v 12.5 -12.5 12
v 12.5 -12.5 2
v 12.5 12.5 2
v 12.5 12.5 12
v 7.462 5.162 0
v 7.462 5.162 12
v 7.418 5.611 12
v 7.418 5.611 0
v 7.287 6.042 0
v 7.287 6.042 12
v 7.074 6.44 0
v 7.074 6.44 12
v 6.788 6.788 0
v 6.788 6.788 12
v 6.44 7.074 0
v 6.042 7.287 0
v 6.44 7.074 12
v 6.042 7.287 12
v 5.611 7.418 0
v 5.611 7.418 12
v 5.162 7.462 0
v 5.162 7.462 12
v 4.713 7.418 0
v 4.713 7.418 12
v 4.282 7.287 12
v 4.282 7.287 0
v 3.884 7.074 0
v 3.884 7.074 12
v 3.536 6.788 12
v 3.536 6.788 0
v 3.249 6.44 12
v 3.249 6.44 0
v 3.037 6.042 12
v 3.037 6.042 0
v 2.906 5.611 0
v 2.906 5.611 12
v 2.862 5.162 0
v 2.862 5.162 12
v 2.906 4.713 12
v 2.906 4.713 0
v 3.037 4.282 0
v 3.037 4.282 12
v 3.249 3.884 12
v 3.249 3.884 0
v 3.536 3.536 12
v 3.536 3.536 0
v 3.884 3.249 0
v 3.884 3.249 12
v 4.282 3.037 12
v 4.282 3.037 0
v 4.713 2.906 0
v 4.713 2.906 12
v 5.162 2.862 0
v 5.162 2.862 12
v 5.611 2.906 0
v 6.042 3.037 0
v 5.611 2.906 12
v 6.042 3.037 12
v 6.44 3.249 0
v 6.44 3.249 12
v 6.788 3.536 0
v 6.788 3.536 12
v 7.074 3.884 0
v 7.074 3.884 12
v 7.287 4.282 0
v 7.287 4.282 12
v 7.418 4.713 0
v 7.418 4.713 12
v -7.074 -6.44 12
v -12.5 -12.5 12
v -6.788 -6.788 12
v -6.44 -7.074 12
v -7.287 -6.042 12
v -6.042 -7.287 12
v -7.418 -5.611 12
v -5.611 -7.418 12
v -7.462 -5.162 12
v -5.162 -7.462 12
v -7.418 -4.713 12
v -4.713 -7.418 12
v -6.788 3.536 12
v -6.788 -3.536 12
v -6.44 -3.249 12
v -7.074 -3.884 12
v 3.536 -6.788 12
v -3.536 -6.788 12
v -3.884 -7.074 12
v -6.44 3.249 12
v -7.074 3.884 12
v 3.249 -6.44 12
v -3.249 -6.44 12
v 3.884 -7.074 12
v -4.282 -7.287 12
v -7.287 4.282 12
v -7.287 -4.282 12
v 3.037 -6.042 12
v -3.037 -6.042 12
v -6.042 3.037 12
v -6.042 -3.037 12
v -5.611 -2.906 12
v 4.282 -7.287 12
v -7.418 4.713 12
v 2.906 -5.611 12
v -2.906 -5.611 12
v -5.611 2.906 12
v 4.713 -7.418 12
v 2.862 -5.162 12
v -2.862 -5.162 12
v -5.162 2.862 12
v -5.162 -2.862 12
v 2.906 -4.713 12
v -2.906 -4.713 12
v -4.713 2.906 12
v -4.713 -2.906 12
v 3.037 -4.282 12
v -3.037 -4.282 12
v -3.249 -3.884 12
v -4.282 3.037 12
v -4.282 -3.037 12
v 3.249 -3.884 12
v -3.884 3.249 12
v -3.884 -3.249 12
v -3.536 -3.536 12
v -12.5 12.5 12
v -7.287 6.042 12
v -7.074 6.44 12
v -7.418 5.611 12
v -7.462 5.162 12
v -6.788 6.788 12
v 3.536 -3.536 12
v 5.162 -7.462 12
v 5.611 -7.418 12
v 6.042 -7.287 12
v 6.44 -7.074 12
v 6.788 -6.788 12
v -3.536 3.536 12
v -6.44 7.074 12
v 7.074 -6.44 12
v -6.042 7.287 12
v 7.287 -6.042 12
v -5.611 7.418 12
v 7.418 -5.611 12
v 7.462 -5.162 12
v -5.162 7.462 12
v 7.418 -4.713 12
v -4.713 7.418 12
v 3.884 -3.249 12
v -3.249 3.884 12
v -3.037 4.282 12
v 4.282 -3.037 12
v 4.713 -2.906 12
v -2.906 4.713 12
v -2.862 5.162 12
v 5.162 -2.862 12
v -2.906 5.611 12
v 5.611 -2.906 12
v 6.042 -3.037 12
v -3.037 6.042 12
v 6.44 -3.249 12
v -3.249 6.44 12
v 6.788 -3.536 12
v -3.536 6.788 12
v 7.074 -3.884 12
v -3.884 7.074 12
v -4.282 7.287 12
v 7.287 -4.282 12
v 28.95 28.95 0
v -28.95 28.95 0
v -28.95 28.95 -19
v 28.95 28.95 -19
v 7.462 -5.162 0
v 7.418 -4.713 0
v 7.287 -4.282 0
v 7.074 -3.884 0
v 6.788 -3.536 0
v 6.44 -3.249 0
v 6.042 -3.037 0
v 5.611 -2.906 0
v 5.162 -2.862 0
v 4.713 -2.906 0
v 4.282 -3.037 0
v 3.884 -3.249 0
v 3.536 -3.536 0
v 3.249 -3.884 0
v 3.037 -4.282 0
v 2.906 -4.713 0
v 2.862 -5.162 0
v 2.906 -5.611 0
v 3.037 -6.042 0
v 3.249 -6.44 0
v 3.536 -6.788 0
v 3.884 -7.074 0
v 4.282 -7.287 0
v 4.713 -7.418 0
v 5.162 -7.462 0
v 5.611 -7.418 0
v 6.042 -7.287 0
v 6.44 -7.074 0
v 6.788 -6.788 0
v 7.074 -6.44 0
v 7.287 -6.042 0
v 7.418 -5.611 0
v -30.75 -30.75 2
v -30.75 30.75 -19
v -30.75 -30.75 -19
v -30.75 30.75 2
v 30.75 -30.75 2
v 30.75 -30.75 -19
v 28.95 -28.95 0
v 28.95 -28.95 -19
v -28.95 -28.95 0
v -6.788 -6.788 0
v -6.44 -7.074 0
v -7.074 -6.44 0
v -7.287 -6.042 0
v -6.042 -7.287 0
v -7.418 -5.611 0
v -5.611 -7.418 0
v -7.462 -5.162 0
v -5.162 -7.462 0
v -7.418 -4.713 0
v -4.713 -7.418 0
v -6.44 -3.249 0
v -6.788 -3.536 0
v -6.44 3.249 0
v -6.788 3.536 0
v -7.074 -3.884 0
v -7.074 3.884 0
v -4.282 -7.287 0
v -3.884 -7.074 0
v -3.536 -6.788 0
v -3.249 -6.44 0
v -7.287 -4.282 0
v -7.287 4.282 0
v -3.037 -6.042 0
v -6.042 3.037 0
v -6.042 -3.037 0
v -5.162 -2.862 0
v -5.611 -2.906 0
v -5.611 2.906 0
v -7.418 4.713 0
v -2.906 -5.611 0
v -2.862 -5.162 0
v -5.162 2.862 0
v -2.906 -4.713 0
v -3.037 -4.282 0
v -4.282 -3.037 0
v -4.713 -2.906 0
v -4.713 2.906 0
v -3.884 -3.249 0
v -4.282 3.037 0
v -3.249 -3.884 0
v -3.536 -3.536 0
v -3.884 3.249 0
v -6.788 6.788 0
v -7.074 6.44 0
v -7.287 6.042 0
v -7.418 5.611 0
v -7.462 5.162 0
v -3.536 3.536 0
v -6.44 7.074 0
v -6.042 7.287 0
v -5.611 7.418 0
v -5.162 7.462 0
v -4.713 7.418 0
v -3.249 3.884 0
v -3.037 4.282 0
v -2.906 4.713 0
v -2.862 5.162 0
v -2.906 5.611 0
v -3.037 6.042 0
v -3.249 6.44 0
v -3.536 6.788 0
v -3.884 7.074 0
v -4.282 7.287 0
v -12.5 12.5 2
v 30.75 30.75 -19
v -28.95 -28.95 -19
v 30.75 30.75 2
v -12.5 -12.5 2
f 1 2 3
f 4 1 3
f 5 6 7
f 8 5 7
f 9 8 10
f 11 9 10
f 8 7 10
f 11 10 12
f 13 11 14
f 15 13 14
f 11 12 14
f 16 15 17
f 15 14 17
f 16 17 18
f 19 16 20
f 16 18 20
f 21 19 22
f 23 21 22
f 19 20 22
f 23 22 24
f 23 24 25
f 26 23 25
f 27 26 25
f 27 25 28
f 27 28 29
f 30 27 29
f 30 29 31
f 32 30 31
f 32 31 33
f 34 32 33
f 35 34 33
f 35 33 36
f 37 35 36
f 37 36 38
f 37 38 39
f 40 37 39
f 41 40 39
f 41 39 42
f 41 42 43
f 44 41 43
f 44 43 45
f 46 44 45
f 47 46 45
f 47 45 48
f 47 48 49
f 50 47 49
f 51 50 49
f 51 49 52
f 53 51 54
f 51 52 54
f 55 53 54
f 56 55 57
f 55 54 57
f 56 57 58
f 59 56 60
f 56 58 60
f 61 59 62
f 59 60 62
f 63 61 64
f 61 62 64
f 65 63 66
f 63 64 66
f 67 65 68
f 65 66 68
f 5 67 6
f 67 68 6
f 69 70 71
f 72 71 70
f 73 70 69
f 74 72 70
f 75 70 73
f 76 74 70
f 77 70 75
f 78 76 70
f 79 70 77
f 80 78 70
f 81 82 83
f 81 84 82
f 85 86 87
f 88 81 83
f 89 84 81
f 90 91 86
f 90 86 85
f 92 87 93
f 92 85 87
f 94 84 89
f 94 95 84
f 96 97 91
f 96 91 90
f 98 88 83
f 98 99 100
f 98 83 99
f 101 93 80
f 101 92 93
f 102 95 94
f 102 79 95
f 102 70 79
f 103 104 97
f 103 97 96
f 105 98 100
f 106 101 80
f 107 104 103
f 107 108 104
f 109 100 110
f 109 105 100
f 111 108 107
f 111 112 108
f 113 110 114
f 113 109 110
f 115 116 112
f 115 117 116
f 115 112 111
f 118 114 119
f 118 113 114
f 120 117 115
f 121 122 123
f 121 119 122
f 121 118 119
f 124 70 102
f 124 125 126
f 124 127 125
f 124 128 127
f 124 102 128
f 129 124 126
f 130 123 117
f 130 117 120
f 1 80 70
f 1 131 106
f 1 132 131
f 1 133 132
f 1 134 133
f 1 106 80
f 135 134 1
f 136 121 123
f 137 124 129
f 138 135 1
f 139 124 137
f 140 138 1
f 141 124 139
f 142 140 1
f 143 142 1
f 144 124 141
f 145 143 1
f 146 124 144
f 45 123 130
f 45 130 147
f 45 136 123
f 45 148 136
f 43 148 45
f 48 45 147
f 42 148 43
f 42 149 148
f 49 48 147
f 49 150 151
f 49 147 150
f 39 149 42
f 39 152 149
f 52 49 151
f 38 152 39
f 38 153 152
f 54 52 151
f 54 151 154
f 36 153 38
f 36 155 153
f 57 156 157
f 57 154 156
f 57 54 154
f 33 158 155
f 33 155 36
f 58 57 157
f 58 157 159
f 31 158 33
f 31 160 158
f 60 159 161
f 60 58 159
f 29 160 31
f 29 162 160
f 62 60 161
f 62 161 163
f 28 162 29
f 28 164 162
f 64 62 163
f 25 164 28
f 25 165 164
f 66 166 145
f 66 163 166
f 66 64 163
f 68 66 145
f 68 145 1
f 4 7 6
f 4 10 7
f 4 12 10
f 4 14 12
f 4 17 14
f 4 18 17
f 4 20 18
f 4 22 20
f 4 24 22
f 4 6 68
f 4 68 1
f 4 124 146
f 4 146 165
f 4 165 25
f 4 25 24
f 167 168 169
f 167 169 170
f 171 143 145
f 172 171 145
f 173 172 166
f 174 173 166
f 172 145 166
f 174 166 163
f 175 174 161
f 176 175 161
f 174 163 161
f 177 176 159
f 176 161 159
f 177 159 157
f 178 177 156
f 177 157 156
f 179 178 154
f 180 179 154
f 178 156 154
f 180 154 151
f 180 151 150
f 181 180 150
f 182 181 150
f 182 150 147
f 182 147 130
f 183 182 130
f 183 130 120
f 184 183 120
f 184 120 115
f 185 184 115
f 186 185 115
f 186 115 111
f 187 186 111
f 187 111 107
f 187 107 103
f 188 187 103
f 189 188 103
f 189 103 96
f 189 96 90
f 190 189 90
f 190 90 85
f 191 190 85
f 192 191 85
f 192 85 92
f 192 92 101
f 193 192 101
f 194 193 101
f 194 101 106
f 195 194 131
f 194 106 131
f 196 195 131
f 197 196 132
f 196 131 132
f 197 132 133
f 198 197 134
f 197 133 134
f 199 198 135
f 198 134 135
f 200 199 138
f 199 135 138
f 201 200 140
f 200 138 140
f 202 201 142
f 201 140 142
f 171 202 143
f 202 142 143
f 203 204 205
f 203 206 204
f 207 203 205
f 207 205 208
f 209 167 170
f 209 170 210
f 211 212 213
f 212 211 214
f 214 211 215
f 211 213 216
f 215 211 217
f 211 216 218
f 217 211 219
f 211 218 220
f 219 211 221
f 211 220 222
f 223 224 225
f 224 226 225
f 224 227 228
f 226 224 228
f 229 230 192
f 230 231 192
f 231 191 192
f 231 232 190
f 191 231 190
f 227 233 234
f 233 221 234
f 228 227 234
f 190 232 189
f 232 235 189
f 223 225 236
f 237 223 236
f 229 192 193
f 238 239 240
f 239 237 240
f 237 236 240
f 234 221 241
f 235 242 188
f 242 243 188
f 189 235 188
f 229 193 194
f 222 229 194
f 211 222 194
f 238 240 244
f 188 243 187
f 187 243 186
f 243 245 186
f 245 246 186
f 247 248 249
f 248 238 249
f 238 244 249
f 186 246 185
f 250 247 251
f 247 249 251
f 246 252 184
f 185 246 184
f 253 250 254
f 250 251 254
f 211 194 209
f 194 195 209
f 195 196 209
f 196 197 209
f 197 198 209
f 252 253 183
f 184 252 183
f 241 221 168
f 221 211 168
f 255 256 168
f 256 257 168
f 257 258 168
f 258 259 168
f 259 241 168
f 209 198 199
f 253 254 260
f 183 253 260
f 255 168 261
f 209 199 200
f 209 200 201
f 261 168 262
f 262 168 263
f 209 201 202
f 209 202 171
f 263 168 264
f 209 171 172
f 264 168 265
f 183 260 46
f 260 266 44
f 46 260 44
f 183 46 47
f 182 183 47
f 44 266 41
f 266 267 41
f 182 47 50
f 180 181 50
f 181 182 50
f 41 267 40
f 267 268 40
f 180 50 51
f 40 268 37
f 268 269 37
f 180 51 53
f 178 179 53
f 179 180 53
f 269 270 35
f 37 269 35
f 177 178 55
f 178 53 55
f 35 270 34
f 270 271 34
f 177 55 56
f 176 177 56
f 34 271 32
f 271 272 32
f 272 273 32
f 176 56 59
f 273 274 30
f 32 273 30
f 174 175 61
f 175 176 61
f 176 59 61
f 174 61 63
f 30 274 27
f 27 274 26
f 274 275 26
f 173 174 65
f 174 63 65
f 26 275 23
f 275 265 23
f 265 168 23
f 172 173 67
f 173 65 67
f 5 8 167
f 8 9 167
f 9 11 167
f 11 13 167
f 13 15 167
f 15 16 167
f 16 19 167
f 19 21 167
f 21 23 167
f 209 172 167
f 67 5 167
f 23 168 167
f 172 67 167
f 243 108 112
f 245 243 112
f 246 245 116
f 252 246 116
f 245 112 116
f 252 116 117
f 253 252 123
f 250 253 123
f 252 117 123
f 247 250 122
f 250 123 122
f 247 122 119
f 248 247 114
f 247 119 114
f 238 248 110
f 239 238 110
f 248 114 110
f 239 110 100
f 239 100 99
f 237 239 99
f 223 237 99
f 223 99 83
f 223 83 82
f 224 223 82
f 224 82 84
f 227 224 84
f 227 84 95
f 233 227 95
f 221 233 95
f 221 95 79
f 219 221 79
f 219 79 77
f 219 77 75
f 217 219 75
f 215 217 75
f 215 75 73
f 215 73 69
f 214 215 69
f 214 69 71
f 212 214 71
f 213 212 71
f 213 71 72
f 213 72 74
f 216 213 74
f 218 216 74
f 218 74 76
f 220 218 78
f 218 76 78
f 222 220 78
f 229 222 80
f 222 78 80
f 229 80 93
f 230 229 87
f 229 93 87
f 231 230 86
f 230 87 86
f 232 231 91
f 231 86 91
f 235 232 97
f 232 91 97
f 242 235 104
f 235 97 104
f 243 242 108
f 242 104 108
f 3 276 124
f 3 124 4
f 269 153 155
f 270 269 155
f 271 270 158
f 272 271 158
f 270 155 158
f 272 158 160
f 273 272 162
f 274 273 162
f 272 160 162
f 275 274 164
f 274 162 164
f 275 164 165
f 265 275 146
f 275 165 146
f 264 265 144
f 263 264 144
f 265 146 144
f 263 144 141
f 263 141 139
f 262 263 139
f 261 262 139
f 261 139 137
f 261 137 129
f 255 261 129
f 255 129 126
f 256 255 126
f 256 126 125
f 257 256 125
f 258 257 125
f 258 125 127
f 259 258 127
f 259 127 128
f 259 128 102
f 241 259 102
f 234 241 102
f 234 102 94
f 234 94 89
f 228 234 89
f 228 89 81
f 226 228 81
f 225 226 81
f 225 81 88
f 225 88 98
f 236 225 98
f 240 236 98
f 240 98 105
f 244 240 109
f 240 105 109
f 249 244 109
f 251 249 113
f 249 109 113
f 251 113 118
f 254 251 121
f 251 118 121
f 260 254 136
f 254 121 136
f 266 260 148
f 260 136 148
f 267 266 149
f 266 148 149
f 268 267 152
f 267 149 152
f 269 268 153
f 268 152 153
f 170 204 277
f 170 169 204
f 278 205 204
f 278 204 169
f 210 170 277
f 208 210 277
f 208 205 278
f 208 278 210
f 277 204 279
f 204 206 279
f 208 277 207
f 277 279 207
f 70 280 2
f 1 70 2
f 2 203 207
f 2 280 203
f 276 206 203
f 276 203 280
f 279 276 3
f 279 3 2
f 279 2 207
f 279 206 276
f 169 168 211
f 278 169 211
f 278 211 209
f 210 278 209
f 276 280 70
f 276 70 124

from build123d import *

# Parameters (mm, degrees)
SKETCH_W      = 61.5
SKETCH_H      = 61.5
PAD_DEPTH     = 2
SKETCH001_W   = 61.5
SKETCH001_H   = 61.5
SKETCH001_W_2 = 57.9
SKETCH001_H_2 = 57.9
PAD001_DEPTH  = 19
SKETCH002_W   = 25
SKETCH002_H   = 25
PAD002_DEPTH  = 10
SKETCH003_R   = 2.3
POCKET_DEPTH  = 31.001


with BuildPart() as part:
    # Sketch → Pad (new body)
    with BuildSketch(Plane.XY):
        Rectangle(SKETCH_W, SKETCH_H)
    extrude(amount=PAD_DEPTH)

    # Sketch001 → Pad001 (new body)
    with BuildSketch(Plane(origin=(0, 0, 0), x_dir=(1, 0, 0), z_dir=(0, 0, -1))):
        Rectangle(SKETCH001_W, SKETCH001_H)
        Rectangle(SKETCH001_W_2, SKETCH001_H_2, mode=Mode.SUBTRACT)
    extrude(amount=PAD001_DEPTH)

    # Sketch002 → Pad002 (new body)
    with BuildSketch(Plane.XY.offset(2)):
        Rectangle(SKETCH002_W, SKETCH002_H)
    extrude(amount=PAD002_DEPTH)

    # Sketch003 → Pocket (cut, through all)
    with BuildSketch(Plane.XY.offset(12)):
        with Locations((-5.16188, 5.16188)):
            Circle(SKETCH003_R)
        with Locations((5.16188, -5.16188)):
            Circle(SKETCH003_R)
        with Locations((5.16188, 5.16188)):
            Circle(SKETCH003_R)
        with Locations((-5.16188, -5.16188)):
            Circle(SKETCH003_R)
    extrude(amount=-POCKET_DEPTH, mode=Mode.SUBTRACT)


solid = part.part
